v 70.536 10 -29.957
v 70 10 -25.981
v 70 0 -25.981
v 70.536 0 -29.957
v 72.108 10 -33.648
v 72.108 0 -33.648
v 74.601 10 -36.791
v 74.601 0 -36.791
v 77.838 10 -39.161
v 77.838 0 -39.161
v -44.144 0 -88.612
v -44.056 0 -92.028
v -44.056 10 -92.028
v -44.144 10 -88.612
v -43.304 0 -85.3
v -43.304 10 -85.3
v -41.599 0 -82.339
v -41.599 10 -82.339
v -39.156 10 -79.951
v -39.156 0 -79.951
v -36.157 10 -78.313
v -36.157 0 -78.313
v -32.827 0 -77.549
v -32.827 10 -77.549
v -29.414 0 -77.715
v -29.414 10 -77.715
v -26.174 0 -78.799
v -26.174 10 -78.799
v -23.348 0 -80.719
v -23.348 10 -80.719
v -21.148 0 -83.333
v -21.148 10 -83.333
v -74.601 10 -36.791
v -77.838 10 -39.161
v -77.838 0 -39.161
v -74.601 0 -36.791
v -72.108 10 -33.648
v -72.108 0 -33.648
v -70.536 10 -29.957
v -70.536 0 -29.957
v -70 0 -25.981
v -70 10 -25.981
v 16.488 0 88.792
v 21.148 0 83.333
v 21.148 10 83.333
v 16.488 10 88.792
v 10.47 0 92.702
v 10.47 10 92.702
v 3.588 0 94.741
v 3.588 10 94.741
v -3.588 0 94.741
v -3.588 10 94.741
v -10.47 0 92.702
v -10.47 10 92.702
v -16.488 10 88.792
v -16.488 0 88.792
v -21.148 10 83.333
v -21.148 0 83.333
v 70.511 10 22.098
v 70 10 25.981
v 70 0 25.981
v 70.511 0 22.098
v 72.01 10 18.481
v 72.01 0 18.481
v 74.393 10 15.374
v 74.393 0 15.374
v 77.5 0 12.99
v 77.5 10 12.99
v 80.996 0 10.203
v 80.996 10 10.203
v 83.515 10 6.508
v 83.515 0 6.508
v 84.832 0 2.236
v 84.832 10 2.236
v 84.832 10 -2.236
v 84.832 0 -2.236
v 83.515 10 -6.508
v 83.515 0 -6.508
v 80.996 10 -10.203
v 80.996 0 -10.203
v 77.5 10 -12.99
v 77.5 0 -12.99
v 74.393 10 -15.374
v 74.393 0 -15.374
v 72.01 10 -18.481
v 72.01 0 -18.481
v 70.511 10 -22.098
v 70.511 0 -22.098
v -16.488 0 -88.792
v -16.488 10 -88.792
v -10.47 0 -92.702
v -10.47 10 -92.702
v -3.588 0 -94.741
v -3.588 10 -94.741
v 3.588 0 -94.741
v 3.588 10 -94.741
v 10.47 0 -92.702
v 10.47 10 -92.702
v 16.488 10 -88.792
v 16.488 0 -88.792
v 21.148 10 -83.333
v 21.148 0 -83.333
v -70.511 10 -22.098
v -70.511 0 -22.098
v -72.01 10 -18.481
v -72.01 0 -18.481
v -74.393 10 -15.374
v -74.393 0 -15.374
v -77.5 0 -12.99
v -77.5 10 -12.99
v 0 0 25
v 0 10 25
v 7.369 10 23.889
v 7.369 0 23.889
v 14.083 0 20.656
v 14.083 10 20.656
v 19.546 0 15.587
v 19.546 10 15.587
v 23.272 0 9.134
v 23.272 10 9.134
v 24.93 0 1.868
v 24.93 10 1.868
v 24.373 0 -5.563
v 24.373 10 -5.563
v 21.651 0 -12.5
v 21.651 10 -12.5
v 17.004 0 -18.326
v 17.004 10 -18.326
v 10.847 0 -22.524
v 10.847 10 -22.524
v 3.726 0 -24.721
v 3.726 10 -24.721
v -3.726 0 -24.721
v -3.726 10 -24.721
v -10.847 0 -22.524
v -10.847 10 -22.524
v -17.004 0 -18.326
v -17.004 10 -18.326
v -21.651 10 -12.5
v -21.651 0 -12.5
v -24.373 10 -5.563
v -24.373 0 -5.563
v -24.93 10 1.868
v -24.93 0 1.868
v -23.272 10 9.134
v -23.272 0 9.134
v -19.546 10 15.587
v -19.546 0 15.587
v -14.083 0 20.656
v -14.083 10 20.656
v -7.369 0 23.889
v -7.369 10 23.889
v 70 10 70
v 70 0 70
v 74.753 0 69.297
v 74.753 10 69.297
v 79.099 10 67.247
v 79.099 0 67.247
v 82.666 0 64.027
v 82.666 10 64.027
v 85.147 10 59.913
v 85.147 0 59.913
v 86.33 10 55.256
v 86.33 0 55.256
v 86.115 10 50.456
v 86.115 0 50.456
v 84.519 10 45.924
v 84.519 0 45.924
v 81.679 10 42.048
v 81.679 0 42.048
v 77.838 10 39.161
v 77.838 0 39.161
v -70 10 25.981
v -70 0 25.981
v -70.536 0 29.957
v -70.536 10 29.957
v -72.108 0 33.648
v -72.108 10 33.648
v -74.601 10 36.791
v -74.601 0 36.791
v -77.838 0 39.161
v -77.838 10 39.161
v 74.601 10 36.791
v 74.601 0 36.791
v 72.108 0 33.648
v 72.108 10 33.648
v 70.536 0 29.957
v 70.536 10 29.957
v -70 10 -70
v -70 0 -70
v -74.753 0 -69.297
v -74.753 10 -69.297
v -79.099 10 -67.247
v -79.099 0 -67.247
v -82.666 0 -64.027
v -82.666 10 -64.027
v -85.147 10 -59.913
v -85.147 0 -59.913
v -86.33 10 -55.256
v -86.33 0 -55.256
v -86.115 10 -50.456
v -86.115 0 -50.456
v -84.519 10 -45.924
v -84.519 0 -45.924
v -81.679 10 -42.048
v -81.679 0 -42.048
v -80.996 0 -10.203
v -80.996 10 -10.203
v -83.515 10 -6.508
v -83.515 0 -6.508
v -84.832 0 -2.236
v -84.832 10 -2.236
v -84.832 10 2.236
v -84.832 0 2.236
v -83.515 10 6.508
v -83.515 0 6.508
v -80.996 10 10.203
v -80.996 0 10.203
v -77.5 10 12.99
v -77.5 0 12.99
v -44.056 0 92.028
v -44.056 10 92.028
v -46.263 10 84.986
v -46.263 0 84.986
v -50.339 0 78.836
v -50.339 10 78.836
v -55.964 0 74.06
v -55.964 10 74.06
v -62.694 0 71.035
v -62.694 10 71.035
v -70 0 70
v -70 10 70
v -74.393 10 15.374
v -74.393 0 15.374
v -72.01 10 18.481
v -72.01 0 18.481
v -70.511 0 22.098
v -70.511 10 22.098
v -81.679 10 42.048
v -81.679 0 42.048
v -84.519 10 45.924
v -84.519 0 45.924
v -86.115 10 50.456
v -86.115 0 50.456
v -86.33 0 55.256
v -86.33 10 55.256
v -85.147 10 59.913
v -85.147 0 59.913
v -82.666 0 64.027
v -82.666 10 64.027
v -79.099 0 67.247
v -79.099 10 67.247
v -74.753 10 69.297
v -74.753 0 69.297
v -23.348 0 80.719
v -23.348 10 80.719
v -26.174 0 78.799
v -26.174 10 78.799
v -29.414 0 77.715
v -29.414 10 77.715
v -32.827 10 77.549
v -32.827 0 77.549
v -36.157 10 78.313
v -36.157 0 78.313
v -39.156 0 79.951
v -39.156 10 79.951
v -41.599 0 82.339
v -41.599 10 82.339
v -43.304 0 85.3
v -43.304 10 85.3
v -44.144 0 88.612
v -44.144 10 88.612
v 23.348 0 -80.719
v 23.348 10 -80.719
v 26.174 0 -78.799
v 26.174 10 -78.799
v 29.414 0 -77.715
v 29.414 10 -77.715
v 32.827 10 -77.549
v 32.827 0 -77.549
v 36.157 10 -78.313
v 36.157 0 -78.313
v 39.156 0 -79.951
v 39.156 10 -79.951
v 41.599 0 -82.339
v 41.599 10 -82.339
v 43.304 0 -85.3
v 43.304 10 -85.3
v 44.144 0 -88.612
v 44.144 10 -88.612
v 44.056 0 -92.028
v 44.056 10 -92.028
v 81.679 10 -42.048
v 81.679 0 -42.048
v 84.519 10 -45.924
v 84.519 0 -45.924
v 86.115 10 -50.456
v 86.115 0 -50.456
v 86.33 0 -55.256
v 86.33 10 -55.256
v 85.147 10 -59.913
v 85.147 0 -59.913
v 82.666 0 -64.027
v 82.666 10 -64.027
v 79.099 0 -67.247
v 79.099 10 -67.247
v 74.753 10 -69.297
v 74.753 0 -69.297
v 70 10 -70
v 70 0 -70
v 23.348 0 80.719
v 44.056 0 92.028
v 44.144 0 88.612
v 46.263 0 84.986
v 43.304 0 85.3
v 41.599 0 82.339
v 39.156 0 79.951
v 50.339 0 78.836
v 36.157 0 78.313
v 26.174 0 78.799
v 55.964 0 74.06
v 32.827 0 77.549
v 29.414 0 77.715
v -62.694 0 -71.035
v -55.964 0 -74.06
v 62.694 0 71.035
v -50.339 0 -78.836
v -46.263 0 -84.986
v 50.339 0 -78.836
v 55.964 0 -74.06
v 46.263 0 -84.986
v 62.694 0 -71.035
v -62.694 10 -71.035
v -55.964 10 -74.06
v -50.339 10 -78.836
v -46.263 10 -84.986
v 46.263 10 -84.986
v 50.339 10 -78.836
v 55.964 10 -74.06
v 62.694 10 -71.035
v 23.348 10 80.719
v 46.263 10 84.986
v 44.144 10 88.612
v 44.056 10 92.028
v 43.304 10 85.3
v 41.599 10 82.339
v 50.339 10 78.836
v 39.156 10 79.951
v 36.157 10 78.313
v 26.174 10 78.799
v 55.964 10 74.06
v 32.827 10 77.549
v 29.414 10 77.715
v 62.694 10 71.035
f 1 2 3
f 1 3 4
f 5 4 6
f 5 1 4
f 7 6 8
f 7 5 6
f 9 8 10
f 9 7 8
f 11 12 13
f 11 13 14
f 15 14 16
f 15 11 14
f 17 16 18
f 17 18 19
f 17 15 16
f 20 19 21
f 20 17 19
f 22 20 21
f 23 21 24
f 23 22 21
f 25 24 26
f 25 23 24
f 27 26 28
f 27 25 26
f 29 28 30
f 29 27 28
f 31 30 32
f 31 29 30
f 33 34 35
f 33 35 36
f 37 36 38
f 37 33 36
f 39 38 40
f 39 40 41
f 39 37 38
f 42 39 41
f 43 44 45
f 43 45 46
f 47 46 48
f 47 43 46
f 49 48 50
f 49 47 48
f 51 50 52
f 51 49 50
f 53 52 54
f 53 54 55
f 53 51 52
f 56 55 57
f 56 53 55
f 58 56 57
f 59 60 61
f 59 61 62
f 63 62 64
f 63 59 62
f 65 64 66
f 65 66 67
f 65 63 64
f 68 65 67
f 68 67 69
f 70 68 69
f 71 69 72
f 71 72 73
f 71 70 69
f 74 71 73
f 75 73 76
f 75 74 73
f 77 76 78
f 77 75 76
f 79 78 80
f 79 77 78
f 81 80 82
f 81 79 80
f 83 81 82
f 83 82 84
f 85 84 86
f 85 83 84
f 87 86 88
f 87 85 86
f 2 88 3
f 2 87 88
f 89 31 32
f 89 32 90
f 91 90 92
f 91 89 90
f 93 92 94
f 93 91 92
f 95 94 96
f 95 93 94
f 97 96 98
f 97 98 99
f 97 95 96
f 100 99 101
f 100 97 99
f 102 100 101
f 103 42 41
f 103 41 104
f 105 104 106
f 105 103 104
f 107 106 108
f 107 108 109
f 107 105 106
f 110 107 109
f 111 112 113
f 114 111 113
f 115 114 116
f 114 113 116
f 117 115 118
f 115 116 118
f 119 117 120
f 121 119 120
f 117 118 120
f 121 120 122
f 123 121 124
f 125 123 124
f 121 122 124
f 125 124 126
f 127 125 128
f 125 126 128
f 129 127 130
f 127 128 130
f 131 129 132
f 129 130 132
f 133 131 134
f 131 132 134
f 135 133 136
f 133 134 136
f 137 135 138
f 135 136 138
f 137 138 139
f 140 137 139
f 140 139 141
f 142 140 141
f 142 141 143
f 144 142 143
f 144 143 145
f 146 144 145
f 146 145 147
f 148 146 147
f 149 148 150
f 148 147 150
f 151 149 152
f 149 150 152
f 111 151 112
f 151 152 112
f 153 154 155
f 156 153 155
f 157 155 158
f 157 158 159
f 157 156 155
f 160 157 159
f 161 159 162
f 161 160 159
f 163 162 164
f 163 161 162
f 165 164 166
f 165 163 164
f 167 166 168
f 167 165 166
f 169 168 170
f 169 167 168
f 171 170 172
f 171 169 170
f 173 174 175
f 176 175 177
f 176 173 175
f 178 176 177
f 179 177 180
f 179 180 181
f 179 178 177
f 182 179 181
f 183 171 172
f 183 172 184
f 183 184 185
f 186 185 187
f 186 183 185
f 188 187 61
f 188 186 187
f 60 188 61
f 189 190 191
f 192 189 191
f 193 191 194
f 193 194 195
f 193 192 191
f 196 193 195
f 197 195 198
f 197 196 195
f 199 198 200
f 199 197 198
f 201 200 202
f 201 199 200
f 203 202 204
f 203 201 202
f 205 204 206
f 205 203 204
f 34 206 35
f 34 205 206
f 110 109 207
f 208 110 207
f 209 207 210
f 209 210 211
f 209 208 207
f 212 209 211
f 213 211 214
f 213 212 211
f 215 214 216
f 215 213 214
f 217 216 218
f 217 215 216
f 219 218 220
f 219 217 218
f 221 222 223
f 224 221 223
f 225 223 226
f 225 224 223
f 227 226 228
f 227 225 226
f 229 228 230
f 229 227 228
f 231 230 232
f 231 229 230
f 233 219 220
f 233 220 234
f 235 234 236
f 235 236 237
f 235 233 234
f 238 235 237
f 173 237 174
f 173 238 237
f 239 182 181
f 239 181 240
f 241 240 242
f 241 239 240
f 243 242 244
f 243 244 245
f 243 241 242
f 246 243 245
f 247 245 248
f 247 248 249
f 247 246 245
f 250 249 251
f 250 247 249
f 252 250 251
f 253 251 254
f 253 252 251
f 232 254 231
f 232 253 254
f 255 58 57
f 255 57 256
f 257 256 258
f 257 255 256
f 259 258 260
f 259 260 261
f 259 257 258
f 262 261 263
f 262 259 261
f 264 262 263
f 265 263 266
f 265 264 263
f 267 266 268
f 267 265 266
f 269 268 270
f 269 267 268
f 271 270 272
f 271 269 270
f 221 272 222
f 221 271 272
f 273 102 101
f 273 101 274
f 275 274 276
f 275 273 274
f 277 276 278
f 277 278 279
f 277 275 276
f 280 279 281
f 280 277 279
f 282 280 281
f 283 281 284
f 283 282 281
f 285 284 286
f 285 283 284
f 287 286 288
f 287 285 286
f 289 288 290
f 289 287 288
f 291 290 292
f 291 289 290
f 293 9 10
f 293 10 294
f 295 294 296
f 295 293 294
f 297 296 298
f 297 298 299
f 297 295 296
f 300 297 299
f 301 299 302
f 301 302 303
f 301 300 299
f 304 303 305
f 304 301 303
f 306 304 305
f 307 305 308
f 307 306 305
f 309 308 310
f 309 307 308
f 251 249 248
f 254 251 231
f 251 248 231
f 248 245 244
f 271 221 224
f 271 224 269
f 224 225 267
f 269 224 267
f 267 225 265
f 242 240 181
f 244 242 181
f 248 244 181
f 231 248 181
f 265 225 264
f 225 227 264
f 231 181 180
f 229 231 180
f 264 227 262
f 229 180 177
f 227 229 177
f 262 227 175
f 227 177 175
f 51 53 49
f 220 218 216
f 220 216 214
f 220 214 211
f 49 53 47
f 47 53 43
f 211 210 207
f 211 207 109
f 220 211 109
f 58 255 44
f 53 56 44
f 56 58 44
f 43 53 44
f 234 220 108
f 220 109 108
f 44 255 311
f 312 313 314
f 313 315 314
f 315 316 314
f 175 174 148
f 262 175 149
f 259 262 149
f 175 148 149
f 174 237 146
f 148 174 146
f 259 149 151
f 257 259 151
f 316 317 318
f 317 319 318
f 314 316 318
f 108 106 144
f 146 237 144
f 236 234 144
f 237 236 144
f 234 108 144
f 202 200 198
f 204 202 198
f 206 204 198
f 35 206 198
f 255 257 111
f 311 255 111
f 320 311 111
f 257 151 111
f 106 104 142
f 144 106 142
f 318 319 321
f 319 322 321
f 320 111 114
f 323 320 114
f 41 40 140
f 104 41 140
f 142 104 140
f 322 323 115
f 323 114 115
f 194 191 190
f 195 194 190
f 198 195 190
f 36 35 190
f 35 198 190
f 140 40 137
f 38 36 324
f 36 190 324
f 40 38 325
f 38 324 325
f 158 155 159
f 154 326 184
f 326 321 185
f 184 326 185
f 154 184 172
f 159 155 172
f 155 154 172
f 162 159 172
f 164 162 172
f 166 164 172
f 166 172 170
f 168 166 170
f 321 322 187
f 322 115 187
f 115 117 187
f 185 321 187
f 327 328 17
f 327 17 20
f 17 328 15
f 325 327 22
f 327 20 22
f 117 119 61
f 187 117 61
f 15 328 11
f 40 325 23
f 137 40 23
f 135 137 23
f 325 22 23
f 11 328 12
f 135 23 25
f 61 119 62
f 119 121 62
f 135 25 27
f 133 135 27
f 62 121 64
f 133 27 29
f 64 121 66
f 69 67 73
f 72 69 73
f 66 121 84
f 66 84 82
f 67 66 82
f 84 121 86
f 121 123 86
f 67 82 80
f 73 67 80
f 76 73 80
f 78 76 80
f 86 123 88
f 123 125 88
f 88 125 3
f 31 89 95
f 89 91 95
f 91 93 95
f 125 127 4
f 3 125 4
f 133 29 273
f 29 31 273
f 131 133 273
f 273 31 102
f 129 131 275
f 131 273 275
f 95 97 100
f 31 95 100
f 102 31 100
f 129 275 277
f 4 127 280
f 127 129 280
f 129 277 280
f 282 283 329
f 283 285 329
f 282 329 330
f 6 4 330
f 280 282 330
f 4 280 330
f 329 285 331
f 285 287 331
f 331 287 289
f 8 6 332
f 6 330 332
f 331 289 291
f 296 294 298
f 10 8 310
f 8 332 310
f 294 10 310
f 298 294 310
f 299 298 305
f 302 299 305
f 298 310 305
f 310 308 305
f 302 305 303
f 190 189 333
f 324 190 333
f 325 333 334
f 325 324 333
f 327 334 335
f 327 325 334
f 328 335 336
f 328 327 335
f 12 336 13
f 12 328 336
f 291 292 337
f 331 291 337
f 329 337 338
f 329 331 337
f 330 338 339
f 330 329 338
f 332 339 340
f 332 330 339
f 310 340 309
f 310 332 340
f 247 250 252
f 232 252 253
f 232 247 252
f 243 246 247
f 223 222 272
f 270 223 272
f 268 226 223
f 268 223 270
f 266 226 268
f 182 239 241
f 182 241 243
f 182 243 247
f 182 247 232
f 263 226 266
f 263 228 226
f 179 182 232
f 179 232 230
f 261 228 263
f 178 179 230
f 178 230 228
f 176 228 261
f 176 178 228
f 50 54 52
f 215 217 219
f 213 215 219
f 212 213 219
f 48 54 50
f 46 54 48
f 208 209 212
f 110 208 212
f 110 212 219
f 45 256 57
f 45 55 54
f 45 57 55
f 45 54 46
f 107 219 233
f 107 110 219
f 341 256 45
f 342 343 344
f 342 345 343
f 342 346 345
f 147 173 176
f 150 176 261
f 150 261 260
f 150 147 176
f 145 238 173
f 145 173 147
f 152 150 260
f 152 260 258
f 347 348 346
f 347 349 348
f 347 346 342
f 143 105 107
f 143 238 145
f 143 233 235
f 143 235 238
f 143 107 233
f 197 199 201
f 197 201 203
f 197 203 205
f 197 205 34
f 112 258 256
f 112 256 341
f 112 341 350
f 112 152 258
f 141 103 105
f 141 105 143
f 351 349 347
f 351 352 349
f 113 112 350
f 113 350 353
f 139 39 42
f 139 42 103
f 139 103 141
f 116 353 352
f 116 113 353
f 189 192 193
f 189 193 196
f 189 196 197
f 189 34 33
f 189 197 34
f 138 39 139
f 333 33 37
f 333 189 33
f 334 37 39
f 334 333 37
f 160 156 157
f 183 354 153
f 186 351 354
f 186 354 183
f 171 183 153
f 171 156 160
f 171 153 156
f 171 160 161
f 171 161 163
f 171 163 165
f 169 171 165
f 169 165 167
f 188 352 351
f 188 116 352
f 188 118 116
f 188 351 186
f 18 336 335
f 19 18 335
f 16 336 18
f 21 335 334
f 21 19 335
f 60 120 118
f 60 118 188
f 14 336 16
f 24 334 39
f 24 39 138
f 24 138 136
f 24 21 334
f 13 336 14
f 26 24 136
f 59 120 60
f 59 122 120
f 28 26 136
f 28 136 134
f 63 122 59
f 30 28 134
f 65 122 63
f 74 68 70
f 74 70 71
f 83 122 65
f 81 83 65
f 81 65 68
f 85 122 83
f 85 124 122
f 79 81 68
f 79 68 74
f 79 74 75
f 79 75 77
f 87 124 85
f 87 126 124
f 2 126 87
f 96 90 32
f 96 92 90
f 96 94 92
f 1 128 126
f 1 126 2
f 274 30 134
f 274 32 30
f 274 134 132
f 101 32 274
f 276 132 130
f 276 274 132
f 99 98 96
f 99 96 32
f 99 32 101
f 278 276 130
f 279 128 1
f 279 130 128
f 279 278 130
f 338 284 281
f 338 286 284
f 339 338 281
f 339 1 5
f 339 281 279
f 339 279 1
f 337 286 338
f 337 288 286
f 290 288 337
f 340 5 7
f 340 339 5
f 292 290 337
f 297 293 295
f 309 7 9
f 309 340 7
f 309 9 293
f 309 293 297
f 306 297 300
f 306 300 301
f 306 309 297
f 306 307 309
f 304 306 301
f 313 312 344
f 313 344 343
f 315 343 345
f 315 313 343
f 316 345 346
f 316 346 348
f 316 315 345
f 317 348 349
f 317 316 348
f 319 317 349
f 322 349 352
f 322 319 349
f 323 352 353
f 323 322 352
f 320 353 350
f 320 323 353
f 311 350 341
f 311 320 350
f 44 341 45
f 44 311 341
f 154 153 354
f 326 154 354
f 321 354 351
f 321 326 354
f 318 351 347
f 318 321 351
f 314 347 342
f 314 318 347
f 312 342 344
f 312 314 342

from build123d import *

# Parameters (mm, degrees)
SALIENTE_EXTRUIR1_DEPTH = 10
SALIENTE_EXTRUIR2_DEPTH = 10
CROQUIS3_R              = 25
CORTAR_EXTRUIR1_DEPTH   = 10


with BuildPart() as part:
    # Croquis1 → Saliente-Extruir1 (new body)
    with BuildSketch(Plane(origin=(0, 0, 0), x_dir=(1, 0, 0), z_dir=(0, 1, 0))):
        with BuildLine():
            Line((-70, -70), (-70, 70))
            ThreePointArc((-70, 70), (-52.983030462, 76.249658661), (-44.055908755, 92.027554074))
            ThreePointArc((-44.055908755, 92.027554074), (-36.156795126, 78.313355526), (-21.147629234, 83.333333333))
            ThreePointArc((-21.147629234, 83.333333333), (0, 95), (21.147629234, 83.333333333))
            ThreePointArc((21.147629234, 83.333333333), (36.156795126, 78.313355526), (44.055908755, 92.027554074))
            ThreePointArc((44.055908755, 92.027554074), (52.983030462, 76.249658661), (70, 70))
            Line((70, 70), (70, -70))
            ThreePointArc((70, -70), (52.983030462, -76.249658661), (44.055908755, -92.027554074))
            ThreePointArc((44.055908755, -92.027554074), (36.156795126, -78.313355526), (21.147629234, -83.333333333))
            ThreePointArc((21.147629234, -83.333333333), (0, -95), (-21.147629234, -83.333333333))
            ThreePointArc((-21.147629234, -83.333333333), (-36.156795126, -78.313355526), (-44.055908755, -92.027554074))
            ThreePointArc((-44.055908755, -92.027554074), (-52.983030462, -76.249658661), (-70, -70))
        make_face()
    extrude(amount=SALIENTE_EXTRUIR1_DEPTH)

    # Croquis2 → Saliente-Extruir2 (add)
    with BuildSketch(Plane(origin=(0, 10, 0), x_dir=(1, 0, 0), z_dir=(0, 1, 0))):
        with BuildLine():
            Line((-70, 25.98076189), (-70, 70))
            ThreePointArc((-70, 70), (-85.909969357, 57.627811916), (-77.837993487, 39.160506523))
            ThreePointArc((-77.837993487, 39.160506523), (-72.107558403, 33.647896498), (-70, 25.98076189))
        make_face()
        with BuildLine():
            ThreePointArc((77.837993487, 39.160506523), (85.909969357, 57.627811916), (70, 70))
            Line((70, 70), (70, 25.98076213))
            ThreePointArc((70, 25.98076213), (72.107558465, 33.647896602), (77.837993487, 39.160506523))
        make_face()
        with BuildLine():
            ThreePointArc((77.5, 12.990381057), (72.009618939, 18.480762121), (70, 25.98076213))
            Line((70, 25.98076213), (70, -25.98076213))
            ThreePointArc((70, -25.98076213), (72.009618939, -18.480762121), (77.5, -12.990381057))
            ThreePointArc((77.5, -12.990381057), (85, 0), (77.5, 12.990381057))
        make_face()
        with BuildLine():
            Line((-70, -25.980762199), (-70, 25.98076189))
            ThreePointArc((-70, 25.98076189), (-72.009618999, 18.480762017), (-77.5, 12.990381057))
            ThreePointArc((-77.5, 12.990381057), (-85, 0), (-77.5, -12.990381057))
            ThreePointArc((-77.5, -12.990381057), (-72.009618922, -18.480762151), (-70, -25.980762199))
        make_face()
        with BuildLine():
            Line((-70, -70), (-70, -25.980762199))
            ThreePointArc((-70, -25.980762199), (-72.107558482, -33.647896631), (-77.837993487, -39.160506523))
            ThreePointArc((-77.837993487, -39.160506523), (-85.909969357, -57.627811916), (-70, -70))
        make_face()
        with BuildLine():
            ThreePointArc((77.837993487, -39.160506523), (72.107558465, -33.647896602), (70, -25.98076213))
            Line((70, -25.98076213), (70, -70))
            ThreePointArc((70, -70), (85.909969357, -57.627811916), (77.837993487, -39.160506523))
        make_face()
    extrude(amount=-SALIENTE_EXTRUIR2_DEPTH)

    # Croquis3 → Cortar-Extruir1 (cut)
    with BuildSketch(Plane(origin=(0, 10, 0), x_dir=(1, 0, 0), z_dir=(0, 1, 0))):
        with Locations(Location((0, 0, 0), (0, 0, 270))):
            Circle(CROQUIS3_R)
    extrude(amount=-CORTAR_EXTRUIR1_DEPTH, mode=Mode.SUBTRACT)


solid = part.part
